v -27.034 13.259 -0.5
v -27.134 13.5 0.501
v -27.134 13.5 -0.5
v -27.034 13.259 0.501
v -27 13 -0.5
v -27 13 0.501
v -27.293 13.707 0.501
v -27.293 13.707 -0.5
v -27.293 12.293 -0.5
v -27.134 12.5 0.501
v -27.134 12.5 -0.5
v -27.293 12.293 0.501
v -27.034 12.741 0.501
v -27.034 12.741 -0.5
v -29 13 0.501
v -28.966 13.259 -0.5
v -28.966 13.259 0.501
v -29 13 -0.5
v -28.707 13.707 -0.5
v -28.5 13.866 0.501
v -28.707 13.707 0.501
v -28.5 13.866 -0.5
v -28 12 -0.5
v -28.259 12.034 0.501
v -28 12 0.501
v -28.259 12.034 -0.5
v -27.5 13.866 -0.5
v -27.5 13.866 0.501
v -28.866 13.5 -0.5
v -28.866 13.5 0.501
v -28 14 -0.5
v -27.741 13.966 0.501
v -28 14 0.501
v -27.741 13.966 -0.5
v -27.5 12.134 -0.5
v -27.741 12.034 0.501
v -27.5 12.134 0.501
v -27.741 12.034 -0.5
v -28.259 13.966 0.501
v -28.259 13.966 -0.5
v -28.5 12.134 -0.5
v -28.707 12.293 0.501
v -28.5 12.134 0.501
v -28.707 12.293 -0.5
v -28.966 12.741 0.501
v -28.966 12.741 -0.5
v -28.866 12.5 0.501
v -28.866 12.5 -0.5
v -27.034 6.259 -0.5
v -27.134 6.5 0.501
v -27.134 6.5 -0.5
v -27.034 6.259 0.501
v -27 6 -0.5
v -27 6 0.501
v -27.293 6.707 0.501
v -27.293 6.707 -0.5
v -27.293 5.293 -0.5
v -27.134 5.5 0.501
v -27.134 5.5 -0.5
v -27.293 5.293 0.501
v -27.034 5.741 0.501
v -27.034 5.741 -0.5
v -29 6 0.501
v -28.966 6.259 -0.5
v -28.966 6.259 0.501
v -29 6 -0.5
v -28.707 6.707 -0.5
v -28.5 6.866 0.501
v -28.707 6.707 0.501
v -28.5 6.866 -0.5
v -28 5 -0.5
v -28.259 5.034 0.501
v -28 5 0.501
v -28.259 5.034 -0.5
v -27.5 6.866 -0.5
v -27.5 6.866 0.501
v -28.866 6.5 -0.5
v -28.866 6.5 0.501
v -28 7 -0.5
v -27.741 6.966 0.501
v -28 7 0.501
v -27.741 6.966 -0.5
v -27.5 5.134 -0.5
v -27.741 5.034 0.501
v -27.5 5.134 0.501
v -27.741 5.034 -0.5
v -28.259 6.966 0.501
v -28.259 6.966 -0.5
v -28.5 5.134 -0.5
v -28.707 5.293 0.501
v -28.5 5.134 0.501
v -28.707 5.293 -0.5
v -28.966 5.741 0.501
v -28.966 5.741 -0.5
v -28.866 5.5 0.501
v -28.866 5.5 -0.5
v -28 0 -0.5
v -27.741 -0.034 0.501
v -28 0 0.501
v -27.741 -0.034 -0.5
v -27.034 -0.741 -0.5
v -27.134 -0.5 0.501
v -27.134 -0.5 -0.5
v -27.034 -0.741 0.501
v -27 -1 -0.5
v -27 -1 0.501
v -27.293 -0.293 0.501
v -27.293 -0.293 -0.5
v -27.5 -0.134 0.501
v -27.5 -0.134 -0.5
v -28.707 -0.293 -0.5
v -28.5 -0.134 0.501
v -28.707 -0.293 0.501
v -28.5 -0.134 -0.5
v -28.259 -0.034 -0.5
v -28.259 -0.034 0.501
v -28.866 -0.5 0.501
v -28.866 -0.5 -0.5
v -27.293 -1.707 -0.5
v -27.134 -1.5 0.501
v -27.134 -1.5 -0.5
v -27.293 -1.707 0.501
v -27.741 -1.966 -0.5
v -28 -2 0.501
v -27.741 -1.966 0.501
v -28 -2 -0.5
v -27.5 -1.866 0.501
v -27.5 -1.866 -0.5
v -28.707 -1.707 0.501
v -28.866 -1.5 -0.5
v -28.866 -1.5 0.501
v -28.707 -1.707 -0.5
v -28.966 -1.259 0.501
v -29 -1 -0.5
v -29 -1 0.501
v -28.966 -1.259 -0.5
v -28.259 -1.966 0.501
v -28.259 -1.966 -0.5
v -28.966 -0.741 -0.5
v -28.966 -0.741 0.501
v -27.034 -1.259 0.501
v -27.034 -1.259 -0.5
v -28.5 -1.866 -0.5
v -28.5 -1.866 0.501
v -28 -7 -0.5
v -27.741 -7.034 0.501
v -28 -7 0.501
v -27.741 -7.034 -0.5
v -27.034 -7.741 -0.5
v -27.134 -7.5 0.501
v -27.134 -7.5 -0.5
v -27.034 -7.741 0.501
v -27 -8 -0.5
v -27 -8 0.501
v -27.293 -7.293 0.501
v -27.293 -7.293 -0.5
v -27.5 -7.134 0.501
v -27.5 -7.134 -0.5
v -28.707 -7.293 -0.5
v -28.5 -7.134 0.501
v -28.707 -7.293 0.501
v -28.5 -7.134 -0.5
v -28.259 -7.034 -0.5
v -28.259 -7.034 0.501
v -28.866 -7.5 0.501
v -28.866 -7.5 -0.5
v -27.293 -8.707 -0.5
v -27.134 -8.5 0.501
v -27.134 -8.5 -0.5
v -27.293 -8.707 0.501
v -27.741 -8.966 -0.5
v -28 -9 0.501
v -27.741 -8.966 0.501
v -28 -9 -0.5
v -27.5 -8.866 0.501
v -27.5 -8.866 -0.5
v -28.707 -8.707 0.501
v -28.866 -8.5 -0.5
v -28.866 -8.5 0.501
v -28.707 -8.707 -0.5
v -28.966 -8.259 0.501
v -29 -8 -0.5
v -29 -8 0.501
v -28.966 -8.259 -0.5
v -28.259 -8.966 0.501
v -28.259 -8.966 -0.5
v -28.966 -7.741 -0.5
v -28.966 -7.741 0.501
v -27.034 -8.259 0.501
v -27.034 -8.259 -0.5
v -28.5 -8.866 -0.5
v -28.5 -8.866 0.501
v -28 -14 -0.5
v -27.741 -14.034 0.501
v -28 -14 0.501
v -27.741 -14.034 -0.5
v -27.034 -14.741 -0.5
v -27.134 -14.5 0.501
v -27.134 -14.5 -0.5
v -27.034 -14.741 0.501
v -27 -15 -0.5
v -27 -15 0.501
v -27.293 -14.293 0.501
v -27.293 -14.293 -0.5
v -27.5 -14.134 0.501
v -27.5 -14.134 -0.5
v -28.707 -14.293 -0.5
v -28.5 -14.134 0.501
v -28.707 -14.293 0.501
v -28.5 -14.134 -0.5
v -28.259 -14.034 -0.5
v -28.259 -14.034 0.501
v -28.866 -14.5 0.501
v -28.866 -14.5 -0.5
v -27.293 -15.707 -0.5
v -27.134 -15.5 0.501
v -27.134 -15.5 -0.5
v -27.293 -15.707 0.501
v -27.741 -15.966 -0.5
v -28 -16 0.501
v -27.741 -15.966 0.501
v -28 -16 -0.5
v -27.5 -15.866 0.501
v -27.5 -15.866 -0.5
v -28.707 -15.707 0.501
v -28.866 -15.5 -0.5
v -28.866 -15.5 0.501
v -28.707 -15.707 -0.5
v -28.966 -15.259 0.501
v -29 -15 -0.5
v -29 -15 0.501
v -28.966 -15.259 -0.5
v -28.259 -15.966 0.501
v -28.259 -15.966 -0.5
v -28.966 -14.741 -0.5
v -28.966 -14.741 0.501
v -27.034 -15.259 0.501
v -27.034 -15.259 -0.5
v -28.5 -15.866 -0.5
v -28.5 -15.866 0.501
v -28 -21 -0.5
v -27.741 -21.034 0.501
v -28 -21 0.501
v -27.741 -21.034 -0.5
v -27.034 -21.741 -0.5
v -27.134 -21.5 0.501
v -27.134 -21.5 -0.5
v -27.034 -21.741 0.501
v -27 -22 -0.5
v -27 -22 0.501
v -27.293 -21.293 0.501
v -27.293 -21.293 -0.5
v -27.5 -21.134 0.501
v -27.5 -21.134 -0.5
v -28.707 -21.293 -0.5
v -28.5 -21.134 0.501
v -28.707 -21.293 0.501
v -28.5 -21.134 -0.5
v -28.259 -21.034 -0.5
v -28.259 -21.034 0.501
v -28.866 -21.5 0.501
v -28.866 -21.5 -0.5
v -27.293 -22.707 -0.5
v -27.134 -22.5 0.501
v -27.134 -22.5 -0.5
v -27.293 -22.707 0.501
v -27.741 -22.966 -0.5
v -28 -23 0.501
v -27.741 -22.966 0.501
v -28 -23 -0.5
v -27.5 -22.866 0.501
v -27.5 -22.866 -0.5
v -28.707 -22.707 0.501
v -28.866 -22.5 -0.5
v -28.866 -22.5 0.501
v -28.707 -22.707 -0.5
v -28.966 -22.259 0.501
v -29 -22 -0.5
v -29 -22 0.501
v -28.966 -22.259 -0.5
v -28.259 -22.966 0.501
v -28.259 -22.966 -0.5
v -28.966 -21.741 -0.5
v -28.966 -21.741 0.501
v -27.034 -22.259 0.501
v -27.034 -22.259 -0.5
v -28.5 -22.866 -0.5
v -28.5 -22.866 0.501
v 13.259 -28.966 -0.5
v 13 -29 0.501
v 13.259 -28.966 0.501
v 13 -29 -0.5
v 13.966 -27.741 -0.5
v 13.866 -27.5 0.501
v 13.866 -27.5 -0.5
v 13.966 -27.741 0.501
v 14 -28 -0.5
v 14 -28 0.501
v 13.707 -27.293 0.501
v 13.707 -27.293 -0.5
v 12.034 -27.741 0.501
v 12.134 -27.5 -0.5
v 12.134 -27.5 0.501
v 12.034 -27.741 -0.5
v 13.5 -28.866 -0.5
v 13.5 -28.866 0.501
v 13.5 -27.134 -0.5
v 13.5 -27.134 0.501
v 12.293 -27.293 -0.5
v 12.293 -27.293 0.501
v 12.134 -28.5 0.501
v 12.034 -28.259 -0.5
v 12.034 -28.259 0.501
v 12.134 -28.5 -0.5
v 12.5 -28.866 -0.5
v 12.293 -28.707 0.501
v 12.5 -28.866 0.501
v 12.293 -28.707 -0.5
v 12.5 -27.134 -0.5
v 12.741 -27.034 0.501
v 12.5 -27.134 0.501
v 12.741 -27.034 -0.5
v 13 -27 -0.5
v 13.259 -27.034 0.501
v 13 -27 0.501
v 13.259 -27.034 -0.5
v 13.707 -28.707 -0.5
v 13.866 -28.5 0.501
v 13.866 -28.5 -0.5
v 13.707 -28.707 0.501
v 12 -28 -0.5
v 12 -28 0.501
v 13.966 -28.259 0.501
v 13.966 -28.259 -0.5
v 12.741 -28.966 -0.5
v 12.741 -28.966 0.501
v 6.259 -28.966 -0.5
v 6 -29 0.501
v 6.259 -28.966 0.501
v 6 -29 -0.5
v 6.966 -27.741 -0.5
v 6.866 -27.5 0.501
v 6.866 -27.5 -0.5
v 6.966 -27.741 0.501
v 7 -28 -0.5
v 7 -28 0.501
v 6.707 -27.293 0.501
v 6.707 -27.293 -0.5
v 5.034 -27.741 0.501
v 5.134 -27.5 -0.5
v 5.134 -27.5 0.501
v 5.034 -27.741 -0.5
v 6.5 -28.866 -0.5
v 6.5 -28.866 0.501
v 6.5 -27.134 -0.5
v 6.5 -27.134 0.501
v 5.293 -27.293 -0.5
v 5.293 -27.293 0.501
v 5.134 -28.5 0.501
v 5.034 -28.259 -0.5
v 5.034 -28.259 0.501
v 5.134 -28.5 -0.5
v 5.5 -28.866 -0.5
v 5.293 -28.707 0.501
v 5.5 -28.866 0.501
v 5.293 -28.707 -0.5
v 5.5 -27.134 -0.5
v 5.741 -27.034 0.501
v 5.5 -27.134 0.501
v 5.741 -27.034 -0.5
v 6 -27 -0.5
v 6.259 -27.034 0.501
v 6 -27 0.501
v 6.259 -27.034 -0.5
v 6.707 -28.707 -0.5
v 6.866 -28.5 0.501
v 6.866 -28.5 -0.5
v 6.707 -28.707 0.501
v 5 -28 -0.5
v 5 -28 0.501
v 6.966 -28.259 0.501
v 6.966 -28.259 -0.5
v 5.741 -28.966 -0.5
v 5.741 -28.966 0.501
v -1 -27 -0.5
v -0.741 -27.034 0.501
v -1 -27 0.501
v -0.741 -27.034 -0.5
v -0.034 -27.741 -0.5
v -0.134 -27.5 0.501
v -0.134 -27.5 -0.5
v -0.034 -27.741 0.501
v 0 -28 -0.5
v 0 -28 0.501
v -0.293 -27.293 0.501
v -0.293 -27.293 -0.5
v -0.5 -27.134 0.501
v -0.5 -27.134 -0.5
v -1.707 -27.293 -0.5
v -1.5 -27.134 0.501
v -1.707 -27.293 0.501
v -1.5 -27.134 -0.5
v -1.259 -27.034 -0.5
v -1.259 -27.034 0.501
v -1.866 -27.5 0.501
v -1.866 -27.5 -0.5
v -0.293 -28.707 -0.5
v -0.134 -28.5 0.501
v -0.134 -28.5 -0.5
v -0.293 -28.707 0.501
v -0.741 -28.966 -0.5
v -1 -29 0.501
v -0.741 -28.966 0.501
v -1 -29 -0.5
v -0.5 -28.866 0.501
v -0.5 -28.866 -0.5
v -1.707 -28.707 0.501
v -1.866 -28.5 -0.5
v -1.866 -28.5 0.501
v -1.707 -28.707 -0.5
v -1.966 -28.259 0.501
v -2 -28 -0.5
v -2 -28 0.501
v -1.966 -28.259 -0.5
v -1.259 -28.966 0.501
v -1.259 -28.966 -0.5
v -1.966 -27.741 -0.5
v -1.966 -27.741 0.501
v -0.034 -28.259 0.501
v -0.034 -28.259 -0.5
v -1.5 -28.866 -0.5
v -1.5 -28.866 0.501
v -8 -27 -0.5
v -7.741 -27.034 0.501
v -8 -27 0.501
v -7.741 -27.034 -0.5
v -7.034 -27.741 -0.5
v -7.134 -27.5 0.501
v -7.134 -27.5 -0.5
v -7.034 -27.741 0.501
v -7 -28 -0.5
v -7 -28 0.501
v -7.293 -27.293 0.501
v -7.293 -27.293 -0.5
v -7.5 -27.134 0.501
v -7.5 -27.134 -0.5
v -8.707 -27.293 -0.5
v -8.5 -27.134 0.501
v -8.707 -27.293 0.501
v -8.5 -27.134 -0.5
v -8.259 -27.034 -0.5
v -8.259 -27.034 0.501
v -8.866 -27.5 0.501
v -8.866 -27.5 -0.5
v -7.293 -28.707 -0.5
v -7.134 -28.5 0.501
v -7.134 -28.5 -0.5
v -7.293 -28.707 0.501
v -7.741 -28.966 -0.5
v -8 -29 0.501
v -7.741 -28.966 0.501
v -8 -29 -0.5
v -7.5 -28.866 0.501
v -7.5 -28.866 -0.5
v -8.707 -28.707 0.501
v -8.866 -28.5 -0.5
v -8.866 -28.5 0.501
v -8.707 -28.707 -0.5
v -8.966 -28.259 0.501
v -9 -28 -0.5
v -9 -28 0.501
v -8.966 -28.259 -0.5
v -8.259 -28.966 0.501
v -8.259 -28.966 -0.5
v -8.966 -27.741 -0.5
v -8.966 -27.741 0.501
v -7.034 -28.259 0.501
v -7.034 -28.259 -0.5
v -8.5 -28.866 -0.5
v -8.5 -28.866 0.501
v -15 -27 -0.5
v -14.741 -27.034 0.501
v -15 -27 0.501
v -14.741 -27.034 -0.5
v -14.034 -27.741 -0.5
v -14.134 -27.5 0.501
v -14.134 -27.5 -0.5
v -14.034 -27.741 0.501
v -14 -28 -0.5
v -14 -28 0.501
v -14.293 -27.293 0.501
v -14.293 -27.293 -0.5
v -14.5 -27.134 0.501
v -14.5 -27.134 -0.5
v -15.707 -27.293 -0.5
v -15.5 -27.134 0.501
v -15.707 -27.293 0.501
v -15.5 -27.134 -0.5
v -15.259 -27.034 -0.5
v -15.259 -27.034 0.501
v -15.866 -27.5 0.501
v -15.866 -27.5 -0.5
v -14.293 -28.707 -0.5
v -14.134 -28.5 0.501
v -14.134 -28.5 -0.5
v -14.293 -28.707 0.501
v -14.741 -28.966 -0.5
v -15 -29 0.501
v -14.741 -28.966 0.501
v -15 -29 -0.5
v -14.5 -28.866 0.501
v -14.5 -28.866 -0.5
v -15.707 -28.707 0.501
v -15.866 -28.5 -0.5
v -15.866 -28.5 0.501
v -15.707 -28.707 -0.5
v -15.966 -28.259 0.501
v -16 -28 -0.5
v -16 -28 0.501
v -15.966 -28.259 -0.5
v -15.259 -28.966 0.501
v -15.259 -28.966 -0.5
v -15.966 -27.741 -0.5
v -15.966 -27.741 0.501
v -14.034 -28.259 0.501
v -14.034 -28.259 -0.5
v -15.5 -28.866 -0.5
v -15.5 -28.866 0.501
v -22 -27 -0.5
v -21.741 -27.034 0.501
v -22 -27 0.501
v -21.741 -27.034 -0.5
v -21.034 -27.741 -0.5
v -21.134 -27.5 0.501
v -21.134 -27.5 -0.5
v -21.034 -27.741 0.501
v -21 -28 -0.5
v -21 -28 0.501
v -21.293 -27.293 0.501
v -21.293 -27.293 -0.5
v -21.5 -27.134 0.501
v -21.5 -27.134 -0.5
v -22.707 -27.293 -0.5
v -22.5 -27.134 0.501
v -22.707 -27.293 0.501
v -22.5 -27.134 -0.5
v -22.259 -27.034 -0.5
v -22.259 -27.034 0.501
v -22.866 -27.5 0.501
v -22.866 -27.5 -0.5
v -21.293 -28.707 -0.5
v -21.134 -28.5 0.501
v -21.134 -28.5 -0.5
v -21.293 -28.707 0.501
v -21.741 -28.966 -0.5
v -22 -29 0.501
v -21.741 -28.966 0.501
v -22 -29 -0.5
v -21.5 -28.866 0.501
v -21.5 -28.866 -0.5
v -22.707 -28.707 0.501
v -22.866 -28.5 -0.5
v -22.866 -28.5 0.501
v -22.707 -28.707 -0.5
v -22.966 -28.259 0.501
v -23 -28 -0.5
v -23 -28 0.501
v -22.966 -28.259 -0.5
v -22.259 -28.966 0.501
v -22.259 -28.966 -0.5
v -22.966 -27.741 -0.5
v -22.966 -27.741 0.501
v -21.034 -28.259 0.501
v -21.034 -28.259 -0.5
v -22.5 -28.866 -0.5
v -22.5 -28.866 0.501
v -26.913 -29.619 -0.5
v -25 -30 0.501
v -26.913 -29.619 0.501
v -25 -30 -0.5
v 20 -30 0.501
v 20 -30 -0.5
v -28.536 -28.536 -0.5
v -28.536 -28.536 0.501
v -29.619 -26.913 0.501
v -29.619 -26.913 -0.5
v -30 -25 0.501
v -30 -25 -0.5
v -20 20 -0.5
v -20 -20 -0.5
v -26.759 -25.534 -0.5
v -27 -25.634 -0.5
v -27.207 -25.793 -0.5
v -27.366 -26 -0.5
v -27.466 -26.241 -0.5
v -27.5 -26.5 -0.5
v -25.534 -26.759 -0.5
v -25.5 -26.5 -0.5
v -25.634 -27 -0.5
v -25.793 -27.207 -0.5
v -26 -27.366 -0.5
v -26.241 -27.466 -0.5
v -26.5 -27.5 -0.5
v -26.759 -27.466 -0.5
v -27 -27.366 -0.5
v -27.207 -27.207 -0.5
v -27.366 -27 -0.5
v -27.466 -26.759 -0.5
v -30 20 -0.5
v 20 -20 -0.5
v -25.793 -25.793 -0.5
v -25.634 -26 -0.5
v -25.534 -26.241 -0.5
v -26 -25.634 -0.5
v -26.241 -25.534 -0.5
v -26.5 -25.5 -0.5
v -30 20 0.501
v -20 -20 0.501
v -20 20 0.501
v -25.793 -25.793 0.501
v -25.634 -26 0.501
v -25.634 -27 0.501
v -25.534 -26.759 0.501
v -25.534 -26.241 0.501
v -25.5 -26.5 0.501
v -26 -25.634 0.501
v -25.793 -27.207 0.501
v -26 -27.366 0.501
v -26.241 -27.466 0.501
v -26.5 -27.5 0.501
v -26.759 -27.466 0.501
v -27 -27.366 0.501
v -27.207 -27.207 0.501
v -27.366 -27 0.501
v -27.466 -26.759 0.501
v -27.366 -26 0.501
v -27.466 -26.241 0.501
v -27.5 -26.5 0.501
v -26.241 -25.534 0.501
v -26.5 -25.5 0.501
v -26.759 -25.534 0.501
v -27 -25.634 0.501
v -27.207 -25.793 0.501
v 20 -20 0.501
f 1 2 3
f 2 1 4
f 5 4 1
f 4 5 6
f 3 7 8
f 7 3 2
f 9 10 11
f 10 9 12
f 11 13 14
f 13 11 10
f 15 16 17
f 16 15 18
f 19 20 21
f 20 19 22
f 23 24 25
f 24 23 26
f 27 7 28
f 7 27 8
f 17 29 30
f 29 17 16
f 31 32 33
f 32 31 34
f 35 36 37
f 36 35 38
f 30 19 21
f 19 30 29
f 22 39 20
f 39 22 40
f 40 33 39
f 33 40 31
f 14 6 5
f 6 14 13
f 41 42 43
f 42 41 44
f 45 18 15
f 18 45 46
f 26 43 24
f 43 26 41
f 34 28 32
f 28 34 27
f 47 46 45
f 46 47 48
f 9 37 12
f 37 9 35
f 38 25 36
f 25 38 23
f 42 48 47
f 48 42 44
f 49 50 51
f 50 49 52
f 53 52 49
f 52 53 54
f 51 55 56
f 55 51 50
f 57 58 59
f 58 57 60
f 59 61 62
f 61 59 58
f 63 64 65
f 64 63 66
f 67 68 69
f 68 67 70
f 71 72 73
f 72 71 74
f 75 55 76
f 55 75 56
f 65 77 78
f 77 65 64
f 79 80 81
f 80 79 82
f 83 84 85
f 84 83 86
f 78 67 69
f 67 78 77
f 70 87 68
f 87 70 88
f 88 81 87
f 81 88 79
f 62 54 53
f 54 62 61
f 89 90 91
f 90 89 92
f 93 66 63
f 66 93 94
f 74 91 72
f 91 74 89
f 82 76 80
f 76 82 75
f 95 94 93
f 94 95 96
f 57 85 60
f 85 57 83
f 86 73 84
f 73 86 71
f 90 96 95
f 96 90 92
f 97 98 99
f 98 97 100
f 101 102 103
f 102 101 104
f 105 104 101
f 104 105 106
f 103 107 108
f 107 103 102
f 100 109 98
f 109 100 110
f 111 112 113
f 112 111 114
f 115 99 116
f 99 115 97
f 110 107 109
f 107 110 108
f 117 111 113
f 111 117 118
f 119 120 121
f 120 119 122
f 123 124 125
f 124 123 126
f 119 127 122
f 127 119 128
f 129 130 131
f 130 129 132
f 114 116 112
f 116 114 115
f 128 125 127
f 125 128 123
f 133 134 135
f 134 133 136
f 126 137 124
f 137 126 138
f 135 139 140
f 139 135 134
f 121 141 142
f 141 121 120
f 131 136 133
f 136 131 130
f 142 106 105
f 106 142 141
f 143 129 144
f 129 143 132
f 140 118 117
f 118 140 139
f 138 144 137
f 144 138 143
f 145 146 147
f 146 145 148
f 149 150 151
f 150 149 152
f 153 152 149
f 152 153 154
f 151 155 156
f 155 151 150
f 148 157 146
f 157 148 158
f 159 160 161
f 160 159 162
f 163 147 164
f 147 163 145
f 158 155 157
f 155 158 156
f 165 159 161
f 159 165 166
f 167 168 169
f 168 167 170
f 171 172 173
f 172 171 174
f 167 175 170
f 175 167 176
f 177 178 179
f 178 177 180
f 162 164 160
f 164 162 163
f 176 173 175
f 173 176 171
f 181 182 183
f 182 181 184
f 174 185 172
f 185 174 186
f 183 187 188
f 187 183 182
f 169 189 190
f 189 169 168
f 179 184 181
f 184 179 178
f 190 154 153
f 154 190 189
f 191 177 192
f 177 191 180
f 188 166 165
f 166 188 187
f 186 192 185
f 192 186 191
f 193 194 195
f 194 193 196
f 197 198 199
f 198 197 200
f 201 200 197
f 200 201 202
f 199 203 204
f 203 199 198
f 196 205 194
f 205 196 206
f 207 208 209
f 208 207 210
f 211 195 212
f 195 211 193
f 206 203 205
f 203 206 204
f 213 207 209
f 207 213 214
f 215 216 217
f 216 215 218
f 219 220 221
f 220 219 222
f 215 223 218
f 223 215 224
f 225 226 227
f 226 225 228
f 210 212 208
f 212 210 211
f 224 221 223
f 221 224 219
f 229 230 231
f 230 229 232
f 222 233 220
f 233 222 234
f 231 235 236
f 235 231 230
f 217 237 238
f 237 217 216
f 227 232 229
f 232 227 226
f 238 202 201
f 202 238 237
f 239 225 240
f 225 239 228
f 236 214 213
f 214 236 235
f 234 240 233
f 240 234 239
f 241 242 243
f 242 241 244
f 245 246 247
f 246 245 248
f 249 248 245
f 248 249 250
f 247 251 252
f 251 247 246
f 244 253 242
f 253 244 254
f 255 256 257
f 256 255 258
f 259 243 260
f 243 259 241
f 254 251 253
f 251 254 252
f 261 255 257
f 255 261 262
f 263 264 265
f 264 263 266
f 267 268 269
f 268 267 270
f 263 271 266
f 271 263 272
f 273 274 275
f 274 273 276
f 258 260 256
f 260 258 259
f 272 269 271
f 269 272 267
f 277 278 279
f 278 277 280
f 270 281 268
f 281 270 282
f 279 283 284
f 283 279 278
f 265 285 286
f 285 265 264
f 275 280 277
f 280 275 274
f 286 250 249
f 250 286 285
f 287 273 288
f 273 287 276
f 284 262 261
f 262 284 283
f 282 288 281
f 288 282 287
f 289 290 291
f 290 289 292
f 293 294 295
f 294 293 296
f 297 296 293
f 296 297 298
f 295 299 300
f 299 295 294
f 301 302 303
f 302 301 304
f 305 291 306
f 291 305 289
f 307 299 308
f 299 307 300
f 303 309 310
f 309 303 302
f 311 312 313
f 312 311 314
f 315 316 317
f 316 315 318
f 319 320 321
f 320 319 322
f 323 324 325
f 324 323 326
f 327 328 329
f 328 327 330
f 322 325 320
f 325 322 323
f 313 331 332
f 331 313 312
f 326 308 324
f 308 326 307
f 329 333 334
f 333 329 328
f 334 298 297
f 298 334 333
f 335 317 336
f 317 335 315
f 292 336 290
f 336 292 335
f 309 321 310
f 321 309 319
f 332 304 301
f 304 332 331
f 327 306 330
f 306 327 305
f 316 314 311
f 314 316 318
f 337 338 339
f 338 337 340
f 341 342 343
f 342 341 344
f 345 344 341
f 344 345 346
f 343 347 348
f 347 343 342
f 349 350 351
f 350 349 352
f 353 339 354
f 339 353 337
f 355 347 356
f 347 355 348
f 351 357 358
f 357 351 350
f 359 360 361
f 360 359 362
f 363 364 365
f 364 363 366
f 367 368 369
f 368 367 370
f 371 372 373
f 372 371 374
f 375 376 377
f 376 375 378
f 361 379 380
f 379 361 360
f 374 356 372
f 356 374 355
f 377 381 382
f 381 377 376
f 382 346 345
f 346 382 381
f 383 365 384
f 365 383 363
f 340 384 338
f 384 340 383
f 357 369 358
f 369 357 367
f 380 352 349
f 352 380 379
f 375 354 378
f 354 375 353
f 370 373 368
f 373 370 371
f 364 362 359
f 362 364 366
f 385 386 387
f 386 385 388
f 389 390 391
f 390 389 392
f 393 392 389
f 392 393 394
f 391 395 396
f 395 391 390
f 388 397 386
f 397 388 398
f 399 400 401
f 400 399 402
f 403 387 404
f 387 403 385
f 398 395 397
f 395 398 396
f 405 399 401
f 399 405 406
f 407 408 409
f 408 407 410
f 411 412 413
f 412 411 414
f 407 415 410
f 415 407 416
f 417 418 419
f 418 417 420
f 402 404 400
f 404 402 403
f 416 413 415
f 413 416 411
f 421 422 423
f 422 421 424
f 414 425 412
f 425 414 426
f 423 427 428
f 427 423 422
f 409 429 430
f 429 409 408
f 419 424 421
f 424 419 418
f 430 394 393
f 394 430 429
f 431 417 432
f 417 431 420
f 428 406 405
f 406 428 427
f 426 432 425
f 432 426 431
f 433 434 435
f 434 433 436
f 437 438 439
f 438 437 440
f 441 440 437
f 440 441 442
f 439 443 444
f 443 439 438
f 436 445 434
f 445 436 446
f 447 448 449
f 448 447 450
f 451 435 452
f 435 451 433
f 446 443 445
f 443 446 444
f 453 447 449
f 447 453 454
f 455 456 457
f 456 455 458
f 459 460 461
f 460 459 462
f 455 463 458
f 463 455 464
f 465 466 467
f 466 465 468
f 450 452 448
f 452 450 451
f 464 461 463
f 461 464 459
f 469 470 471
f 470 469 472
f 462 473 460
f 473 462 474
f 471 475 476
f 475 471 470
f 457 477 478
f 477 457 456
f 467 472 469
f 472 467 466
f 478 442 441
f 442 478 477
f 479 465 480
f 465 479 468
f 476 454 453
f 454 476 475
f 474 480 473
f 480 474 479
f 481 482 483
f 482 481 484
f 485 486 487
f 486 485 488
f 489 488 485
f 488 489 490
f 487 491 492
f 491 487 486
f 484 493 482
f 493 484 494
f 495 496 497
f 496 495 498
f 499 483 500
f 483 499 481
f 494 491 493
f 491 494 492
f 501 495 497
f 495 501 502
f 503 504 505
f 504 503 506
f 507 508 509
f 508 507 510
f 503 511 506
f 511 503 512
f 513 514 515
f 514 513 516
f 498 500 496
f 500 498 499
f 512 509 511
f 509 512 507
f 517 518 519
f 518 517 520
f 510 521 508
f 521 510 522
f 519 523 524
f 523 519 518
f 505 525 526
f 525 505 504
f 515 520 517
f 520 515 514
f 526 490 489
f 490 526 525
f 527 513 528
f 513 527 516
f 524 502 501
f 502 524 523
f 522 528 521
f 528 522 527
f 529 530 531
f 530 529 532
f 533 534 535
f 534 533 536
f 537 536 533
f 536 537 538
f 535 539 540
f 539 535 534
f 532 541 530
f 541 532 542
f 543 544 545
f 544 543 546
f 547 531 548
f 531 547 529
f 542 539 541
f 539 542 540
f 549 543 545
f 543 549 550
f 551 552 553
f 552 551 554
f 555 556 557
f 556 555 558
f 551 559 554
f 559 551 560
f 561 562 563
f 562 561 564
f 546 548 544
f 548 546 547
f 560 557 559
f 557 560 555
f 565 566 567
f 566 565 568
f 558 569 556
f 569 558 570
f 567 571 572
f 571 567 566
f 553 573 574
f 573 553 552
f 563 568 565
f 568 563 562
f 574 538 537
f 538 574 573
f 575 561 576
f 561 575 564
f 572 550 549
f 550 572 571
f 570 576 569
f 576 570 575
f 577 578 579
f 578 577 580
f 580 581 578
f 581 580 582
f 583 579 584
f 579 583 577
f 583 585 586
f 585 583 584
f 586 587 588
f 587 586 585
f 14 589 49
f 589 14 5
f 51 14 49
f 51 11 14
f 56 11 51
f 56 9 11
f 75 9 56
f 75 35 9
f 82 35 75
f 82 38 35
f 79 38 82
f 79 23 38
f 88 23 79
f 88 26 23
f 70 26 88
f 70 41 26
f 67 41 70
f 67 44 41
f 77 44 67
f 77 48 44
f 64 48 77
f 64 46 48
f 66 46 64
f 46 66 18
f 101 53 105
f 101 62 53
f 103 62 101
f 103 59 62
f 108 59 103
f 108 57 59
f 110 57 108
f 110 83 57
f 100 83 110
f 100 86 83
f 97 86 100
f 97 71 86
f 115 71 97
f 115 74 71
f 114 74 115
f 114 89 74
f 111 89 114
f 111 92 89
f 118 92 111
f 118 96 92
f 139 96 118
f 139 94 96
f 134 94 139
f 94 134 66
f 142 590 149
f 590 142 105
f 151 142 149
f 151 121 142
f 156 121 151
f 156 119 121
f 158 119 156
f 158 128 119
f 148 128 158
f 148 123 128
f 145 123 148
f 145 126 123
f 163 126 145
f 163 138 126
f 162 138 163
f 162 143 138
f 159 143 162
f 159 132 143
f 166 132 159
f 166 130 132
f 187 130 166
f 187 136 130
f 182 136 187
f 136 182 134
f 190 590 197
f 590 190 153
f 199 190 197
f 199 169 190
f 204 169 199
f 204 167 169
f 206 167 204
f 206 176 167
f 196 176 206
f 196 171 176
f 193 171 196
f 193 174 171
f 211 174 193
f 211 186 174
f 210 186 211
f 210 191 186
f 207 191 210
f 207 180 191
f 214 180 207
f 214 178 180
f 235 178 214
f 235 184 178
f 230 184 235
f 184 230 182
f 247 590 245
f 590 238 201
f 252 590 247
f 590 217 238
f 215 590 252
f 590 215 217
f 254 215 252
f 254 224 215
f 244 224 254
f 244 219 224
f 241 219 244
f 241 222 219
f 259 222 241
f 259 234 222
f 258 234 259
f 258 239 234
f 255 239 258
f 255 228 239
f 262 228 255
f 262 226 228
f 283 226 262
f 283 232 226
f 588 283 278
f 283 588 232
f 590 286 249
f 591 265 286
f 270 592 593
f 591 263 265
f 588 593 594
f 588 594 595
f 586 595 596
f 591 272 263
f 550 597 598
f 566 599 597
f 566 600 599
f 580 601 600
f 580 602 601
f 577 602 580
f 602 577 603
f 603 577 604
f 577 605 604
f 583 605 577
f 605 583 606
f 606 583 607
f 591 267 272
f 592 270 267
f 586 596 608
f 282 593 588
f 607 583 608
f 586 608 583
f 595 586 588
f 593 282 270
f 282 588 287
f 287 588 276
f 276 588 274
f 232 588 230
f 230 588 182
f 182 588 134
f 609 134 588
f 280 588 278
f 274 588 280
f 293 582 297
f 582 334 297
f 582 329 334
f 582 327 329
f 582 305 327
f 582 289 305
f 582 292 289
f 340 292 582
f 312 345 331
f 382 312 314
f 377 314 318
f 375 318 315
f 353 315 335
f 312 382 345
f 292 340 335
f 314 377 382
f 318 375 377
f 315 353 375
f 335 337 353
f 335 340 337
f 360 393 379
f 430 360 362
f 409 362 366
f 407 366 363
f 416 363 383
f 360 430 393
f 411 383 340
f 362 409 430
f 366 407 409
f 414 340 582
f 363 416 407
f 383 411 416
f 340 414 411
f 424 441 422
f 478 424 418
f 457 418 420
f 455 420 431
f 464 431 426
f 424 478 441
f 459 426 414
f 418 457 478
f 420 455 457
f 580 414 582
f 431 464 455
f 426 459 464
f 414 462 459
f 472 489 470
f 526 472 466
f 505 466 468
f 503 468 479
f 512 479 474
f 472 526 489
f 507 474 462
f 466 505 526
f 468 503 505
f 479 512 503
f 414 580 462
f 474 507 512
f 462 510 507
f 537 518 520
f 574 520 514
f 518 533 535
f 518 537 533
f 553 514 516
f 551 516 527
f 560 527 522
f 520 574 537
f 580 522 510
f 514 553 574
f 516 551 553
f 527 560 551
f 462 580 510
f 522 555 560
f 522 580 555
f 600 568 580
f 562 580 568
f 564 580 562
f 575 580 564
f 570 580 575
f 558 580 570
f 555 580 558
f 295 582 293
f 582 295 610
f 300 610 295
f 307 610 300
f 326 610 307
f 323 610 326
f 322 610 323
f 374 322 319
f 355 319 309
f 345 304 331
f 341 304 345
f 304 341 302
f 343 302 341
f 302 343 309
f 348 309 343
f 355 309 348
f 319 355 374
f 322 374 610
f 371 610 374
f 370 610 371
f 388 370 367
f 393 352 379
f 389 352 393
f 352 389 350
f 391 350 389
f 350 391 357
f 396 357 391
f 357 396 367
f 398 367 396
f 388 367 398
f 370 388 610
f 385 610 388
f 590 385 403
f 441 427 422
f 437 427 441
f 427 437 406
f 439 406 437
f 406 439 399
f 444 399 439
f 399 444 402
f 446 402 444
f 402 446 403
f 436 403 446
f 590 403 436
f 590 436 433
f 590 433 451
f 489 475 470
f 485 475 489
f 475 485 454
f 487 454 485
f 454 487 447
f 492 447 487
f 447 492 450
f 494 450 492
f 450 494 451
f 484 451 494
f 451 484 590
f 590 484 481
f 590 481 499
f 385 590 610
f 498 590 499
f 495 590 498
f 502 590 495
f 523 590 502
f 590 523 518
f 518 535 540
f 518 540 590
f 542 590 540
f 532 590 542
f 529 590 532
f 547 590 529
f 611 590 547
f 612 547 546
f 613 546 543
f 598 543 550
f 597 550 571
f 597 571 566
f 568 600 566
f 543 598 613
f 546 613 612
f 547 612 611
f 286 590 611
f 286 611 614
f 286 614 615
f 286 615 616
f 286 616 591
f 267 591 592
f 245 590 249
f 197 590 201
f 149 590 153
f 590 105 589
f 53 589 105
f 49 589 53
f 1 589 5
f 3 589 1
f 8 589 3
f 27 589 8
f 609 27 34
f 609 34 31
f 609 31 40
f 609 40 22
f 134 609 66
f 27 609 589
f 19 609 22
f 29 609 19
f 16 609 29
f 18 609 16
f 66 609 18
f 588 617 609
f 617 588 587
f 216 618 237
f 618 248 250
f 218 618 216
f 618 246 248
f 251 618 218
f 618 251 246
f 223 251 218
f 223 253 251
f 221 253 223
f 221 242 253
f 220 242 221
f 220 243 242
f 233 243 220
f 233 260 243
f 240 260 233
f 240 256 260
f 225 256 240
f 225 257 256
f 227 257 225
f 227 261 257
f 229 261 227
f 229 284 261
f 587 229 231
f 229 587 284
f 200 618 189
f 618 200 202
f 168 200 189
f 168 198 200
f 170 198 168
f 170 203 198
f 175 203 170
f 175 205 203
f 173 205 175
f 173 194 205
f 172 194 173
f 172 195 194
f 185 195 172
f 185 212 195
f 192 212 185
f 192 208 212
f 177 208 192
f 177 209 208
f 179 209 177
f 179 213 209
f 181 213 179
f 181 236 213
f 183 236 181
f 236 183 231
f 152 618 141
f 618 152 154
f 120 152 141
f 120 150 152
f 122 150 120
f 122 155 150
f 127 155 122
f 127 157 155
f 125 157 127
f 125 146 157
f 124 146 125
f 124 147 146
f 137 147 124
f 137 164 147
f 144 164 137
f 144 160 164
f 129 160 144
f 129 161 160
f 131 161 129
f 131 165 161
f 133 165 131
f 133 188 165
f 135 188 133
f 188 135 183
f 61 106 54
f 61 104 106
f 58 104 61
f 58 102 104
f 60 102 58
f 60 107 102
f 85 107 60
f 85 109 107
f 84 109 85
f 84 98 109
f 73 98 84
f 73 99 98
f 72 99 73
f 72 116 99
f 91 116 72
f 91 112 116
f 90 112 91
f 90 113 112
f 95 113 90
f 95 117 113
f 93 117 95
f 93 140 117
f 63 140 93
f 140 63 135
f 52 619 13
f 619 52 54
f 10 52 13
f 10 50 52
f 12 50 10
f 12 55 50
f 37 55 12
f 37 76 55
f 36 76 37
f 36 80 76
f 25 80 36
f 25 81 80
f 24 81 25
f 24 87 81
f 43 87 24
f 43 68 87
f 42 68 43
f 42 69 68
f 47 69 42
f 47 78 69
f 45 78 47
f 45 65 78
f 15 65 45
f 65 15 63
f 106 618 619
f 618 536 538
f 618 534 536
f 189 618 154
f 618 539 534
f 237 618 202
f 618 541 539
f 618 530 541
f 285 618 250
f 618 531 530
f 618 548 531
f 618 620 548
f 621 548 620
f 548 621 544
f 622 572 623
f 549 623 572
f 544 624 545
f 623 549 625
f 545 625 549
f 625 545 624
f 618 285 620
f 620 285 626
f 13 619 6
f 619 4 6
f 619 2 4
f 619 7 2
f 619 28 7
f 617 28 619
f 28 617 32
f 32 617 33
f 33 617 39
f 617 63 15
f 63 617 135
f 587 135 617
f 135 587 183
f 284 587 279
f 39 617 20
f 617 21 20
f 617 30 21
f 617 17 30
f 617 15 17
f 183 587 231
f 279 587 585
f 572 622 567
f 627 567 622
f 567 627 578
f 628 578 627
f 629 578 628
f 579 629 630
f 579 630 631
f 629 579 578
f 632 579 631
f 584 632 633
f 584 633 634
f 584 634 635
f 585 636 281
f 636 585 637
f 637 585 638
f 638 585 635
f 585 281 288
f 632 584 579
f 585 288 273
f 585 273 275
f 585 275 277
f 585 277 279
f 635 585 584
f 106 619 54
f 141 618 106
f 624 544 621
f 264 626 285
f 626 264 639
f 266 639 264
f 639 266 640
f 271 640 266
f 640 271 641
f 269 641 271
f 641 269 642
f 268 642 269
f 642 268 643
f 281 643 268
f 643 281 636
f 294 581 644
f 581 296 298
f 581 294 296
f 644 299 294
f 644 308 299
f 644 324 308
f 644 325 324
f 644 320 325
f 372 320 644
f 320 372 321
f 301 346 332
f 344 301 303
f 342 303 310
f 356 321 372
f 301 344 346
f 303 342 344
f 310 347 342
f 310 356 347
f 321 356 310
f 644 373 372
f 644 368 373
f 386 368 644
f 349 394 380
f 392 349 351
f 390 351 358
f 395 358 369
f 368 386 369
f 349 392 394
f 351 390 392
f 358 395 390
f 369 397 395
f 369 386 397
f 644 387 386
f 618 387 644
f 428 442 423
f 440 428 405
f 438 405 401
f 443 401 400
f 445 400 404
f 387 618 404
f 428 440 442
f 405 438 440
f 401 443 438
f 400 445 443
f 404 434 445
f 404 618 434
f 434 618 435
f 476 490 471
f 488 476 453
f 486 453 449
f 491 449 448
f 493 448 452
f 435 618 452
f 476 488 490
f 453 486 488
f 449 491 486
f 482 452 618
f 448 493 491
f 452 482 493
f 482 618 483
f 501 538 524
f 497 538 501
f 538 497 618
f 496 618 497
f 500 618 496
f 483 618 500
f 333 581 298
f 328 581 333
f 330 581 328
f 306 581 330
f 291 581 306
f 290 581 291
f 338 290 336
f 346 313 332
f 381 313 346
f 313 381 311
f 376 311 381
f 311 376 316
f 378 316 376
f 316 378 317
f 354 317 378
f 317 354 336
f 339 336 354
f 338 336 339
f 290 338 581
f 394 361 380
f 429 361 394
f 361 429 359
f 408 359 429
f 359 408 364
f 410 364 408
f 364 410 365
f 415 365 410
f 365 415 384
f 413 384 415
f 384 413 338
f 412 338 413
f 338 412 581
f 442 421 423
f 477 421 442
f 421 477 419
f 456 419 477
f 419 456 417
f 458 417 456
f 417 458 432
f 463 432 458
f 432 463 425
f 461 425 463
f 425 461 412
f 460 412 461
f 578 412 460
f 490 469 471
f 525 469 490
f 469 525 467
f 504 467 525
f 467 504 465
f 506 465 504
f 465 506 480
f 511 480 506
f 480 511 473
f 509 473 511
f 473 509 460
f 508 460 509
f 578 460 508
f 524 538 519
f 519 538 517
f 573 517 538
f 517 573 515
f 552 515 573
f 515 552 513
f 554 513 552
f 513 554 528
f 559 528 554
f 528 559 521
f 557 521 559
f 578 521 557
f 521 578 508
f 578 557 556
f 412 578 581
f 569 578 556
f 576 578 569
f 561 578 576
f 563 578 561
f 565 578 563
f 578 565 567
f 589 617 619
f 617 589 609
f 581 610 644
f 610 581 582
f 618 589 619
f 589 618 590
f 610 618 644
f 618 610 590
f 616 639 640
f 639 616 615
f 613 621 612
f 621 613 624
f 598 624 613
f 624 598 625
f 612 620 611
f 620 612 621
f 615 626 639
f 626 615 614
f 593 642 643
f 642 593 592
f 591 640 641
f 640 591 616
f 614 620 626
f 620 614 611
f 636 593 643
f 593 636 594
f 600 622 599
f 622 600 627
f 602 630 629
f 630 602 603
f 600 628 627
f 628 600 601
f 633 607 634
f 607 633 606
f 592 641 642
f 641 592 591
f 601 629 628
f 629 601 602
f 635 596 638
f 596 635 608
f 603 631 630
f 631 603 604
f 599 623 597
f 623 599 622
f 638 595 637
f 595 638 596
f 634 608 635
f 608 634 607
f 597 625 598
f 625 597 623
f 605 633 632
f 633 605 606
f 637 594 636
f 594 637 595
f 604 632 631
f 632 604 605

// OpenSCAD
module rightangle(w, h, thickness=1.0, rounded_corner=5, width=10, hole_radius=1.0, hole_spacing=7) {
	difference() {
		// Base plate
		minkowski() {
			cube([w-rounded_corner*2, h-rounded_corner*2, thickness], center=true);
			cylinder(r=rounded_corner,h=0.001);
		}

		// Slice off the top (unwanted rounded corners)
		translate([0,(h-rounded_corner*2)/2,0])
			cube([w,width,thickness*2], center=true);

		// Slice off the right (unwanted rounded corners)
		translate([(w-rounded_corner*2)/2,0,0])
			cube([width,h,thickness*2], center=true);

		// Cut out the middle to make an L-shape
		cube([w-rounded_corner*2-width,h-rounded_corner*2-width,thickness*2], center=true);

		// --- Holes ---

		// Corner
		translate([-w/2+rounded_corner/2+hole_radius,-h/2+rounded_corner/2+hole_radius,0])
			cylinder(r=hole_radius, h=thickness*2, center=true, $fn=24);

		// Vertical
		for (i = [0:((h-width-hole_spacing*2)/hole_spacing)]) {
			translate([-w/2+hole_radius*2,h/2-width-hole_spacing-i*hole_spacing,0])
				cylinder(r=hole_radius, h=thickness*2, center=true, $fn=24);
		}

		// Horizontal
		for (i = [0:((w-width-hole_spacing*2)/hole_spacing)]) {
			translate([w/2-width-hole_spacing-i*hole_spacing,-w/2+hole_radius*2,0])
				cylinder(r=hole_radius, h=thickness*2, center=true, $fn=24);
		}
	}
}

rightangle(60,60);
